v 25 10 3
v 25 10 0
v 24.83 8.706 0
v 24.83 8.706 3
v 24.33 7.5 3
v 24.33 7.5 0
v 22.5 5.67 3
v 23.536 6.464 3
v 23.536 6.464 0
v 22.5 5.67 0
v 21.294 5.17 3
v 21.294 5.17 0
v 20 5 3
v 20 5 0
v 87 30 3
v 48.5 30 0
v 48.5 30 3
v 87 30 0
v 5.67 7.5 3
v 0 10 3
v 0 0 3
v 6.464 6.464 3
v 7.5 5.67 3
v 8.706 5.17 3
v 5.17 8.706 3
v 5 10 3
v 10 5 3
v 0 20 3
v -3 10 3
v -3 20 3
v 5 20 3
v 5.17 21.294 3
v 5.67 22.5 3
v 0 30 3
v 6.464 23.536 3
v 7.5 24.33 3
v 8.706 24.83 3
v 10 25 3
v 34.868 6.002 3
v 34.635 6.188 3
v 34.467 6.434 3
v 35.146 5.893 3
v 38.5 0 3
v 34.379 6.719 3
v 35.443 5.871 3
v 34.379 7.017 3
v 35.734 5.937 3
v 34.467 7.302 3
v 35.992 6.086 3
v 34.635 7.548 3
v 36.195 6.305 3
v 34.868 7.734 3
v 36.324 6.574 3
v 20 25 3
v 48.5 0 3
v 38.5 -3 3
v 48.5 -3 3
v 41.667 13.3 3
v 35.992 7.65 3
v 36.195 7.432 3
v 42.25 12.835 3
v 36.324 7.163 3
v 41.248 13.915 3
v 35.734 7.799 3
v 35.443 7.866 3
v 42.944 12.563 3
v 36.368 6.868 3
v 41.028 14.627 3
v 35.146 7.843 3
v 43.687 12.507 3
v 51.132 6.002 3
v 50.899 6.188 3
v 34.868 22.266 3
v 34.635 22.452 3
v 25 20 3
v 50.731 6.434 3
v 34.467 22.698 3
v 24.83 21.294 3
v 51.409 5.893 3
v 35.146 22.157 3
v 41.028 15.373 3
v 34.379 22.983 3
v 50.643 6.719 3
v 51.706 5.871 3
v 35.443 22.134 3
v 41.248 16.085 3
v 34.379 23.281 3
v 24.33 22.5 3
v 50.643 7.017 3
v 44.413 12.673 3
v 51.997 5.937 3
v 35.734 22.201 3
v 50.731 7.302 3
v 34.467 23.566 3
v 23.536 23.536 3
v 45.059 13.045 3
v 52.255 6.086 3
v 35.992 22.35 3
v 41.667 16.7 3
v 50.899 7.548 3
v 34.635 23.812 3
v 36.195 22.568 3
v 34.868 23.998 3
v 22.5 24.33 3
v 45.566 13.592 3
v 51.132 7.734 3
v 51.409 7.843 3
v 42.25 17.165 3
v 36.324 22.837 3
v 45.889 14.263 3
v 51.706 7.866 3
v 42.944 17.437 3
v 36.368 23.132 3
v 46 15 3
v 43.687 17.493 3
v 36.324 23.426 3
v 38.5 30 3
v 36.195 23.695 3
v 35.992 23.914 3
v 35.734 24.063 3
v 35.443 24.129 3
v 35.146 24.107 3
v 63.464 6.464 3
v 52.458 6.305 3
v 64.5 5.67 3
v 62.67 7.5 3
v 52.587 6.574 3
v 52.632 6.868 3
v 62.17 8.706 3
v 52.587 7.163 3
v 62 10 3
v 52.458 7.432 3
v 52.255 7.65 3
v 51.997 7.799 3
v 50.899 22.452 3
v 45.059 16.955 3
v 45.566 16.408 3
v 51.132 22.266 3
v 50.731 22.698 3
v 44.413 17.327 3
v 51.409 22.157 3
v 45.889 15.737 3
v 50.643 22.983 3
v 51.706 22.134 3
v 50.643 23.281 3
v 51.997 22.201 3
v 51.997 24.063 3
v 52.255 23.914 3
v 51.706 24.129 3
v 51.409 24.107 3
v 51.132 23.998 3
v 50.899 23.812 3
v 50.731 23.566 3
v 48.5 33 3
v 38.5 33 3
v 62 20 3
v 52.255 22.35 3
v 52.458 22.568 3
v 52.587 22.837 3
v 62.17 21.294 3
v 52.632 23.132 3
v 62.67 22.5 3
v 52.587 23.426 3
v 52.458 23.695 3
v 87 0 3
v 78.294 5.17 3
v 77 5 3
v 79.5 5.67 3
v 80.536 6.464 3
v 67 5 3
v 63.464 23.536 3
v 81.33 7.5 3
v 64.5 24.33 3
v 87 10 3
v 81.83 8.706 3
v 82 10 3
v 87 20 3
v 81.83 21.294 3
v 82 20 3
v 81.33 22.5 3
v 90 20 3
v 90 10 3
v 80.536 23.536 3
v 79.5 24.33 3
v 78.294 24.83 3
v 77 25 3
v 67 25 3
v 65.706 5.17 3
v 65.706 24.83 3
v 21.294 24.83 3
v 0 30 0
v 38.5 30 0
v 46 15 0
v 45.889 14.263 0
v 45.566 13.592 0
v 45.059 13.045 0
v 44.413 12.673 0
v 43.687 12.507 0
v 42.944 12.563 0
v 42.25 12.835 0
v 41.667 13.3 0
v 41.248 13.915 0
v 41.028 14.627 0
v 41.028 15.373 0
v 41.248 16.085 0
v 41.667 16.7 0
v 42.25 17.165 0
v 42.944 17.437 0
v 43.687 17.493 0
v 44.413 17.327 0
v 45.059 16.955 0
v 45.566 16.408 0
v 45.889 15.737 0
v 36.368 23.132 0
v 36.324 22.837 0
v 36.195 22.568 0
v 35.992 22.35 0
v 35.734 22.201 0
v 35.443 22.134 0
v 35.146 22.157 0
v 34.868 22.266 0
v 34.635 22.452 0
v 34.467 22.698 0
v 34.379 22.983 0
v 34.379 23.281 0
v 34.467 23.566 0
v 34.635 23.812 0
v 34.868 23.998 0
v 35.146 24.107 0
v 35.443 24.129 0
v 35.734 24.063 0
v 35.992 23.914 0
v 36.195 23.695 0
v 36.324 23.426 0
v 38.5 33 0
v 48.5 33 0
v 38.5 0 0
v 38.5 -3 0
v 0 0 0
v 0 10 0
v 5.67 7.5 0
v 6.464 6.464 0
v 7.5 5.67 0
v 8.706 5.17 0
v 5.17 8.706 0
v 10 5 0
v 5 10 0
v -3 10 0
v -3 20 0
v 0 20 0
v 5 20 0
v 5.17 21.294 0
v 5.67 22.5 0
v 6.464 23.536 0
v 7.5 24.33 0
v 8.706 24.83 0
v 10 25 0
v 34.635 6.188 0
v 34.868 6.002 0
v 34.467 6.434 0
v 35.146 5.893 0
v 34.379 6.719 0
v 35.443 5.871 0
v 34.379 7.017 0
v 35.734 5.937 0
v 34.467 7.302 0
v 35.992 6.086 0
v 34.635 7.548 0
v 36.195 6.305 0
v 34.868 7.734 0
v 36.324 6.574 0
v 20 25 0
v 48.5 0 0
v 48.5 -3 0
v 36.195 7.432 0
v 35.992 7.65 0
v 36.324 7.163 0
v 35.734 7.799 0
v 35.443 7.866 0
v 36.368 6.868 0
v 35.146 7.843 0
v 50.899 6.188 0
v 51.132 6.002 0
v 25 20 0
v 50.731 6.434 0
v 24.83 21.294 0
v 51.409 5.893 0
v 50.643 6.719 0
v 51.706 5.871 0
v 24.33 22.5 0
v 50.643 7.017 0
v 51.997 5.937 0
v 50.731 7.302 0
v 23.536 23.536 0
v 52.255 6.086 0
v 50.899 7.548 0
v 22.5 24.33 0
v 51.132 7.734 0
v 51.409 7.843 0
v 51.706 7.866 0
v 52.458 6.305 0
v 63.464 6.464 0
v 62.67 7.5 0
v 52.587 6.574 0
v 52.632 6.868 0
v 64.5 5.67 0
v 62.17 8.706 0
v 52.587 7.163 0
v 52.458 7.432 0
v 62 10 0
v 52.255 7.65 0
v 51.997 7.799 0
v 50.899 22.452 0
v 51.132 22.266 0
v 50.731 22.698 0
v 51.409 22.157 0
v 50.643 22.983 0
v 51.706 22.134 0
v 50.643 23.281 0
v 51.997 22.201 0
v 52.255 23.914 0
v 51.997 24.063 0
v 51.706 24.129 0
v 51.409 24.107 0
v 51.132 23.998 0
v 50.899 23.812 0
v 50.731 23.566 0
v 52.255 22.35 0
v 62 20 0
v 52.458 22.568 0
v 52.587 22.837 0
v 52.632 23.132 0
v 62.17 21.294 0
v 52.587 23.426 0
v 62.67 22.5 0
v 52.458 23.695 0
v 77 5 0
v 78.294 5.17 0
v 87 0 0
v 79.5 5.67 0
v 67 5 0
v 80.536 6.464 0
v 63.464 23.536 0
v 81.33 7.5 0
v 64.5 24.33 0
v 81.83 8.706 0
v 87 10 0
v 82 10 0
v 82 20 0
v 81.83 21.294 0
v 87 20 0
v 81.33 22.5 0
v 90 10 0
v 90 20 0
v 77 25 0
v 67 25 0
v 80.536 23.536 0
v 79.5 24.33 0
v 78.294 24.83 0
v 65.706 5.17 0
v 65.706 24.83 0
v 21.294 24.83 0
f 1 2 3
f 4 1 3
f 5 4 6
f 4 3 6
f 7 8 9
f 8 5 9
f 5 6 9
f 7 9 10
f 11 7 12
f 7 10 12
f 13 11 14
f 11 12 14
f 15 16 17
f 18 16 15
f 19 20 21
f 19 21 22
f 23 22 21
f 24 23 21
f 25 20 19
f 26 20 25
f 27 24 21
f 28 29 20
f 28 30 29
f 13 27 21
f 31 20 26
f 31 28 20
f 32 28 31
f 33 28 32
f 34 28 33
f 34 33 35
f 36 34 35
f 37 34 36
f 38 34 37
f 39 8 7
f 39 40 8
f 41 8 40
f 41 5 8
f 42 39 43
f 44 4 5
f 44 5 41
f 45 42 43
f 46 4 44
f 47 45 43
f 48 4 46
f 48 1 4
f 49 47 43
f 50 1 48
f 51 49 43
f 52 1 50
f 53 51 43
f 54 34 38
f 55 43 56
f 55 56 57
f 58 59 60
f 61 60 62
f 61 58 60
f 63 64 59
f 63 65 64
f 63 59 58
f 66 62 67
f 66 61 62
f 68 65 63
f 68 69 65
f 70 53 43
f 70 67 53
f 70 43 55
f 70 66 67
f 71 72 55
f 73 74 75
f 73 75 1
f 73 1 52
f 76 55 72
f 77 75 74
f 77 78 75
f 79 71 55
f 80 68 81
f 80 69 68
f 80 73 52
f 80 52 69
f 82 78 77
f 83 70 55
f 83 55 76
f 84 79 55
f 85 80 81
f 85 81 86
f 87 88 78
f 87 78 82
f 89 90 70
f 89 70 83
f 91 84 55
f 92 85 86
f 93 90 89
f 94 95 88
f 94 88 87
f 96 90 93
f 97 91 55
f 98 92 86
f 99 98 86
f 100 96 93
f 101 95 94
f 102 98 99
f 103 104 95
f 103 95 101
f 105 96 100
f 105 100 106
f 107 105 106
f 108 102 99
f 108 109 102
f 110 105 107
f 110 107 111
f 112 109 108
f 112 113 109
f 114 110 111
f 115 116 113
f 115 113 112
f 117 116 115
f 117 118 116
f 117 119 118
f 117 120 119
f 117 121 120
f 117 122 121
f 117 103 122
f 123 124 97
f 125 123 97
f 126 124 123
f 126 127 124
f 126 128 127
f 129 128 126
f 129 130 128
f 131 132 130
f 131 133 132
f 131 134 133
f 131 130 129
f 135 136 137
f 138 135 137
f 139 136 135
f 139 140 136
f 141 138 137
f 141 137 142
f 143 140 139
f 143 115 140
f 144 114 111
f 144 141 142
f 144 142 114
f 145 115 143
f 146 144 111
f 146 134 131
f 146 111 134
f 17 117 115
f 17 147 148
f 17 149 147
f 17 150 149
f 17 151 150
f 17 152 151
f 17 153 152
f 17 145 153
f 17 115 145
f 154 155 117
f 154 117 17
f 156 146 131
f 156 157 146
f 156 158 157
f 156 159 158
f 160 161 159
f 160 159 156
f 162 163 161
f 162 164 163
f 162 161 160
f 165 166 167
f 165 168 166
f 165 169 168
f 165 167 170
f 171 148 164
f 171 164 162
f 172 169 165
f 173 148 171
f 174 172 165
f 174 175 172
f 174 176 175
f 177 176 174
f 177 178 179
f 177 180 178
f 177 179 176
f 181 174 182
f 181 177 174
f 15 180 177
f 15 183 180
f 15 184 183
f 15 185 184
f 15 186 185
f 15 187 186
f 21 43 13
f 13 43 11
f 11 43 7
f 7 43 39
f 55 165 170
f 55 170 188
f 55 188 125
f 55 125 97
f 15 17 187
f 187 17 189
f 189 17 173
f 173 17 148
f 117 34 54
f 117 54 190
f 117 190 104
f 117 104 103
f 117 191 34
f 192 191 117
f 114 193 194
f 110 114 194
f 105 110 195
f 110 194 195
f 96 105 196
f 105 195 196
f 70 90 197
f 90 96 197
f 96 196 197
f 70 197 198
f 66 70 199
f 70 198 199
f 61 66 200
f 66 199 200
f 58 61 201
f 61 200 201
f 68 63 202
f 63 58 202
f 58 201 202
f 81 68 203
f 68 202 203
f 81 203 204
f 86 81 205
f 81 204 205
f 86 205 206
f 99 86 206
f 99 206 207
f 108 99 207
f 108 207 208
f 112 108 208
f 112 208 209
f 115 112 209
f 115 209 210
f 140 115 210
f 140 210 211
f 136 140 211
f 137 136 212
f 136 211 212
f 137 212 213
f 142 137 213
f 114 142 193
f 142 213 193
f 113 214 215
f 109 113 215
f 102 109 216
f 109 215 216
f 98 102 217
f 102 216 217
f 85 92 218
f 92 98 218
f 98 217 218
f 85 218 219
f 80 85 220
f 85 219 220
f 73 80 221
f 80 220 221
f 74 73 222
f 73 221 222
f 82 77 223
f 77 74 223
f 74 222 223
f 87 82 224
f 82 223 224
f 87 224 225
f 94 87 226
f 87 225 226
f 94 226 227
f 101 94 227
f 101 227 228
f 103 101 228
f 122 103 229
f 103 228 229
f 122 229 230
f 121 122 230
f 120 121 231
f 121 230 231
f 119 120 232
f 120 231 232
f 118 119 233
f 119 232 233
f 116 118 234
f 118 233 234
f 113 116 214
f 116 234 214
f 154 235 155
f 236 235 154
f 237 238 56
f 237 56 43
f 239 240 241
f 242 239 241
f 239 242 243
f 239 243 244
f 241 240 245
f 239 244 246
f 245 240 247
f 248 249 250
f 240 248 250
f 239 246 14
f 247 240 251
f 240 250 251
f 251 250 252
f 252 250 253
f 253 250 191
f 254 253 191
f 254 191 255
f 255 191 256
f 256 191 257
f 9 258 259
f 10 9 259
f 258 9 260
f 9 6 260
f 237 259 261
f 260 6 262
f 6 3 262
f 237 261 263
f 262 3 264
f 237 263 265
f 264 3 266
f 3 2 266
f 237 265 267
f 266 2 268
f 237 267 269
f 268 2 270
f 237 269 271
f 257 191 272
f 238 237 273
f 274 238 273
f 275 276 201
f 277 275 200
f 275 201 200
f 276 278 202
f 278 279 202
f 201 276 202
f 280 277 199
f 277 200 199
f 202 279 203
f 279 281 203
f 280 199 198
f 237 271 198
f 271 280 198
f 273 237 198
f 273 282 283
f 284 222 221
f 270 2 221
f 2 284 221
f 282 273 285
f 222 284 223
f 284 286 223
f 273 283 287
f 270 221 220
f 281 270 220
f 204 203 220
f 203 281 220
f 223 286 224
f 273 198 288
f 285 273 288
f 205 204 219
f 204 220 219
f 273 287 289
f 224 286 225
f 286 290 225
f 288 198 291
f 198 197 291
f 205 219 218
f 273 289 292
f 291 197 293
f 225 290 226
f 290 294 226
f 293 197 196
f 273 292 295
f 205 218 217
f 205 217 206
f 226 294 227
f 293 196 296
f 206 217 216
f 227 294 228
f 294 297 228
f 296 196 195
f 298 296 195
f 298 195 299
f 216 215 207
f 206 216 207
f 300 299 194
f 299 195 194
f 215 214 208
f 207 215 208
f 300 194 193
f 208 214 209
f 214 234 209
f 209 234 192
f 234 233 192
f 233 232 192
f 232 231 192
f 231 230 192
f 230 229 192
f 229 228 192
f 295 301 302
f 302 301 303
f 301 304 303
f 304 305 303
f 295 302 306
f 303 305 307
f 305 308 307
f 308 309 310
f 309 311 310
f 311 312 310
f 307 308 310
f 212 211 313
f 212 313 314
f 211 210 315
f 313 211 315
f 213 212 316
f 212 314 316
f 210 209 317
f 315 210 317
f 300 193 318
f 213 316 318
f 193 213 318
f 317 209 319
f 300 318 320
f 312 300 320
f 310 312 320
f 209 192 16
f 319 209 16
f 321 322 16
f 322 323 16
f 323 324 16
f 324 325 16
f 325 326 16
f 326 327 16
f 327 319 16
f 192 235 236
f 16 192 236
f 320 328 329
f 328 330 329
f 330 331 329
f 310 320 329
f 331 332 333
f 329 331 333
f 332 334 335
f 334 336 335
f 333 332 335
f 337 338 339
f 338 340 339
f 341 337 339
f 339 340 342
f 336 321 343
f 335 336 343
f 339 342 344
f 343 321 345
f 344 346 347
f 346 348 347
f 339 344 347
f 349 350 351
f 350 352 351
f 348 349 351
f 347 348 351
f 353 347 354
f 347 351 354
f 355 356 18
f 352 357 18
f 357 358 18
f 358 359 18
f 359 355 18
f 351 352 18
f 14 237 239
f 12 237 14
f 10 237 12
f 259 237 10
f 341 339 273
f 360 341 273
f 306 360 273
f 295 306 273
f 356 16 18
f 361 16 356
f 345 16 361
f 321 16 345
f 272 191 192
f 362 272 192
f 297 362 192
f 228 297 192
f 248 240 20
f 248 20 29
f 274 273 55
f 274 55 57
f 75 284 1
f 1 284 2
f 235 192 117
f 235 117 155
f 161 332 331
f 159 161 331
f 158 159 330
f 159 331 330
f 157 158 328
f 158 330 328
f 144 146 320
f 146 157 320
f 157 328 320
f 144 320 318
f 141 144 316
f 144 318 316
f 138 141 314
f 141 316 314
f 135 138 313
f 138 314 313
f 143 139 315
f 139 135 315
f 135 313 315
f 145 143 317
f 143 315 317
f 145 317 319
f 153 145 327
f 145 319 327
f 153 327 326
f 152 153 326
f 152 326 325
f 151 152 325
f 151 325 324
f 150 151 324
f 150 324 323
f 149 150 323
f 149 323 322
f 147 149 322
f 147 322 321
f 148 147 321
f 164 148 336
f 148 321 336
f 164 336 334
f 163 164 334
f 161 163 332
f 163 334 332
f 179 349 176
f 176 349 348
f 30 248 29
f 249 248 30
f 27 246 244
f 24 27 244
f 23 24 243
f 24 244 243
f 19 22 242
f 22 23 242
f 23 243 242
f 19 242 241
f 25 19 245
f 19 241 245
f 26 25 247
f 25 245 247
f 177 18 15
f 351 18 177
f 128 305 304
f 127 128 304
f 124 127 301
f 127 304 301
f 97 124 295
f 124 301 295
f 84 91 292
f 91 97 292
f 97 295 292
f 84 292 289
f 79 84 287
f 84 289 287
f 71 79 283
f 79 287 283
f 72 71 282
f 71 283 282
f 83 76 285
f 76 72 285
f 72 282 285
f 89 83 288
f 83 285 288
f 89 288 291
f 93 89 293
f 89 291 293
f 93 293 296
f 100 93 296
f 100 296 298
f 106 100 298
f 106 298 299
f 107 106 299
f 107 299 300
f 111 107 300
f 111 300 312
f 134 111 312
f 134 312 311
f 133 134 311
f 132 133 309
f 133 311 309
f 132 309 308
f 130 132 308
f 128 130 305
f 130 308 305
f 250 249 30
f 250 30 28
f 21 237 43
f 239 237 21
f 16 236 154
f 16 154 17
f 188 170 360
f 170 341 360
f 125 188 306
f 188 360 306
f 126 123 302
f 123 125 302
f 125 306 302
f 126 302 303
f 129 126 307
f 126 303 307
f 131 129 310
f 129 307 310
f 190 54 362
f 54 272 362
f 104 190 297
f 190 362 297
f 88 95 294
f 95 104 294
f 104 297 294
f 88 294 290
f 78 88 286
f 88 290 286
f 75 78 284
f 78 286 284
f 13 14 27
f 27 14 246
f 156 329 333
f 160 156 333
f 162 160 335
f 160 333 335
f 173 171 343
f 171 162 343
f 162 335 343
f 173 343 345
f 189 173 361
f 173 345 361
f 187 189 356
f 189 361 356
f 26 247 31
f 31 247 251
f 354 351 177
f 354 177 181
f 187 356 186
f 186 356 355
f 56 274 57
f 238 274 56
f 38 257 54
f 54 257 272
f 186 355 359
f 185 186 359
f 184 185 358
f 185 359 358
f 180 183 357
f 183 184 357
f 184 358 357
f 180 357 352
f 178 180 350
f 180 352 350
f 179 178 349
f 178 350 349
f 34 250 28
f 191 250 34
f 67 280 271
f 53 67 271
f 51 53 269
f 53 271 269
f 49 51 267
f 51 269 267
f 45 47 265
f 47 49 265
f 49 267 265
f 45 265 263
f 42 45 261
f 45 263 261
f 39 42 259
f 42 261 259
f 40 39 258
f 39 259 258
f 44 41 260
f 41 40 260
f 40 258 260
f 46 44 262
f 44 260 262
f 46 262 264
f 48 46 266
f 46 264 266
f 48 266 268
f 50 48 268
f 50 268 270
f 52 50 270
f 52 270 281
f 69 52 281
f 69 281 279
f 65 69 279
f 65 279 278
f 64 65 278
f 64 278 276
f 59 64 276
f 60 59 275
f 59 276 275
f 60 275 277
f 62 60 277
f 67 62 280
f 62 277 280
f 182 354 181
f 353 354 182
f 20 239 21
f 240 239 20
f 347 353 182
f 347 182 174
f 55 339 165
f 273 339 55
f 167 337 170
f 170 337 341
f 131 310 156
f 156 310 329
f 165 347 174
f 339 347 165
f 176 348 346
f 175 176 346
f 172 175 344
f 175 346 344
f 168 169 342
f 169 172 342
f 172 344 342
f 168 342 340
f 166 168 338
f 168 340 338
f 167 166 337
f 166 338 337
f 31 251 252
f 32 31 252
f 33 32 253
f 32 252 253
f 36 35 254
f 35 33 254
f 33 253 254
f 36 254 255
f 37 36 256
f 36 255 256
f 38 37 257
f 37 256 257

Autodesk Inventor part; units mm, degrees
ref_plane "YZ Plane" through (0, 0, 0) normal (1, 0, 0) x (0, 1, 0)
ref_plane "XZ Plane" through (0, 0, 0) normal (0, 1, 0) x (-1, 0, 0)
ref_plane "XY Plane" through (0, 0, 0) normal (0, 0, 1) x (1, 0, 0)
sketch "Sketch1" plane through (0, 0, 0) normal (0, 0, 1) x (1, 0, 0)
  line L0 (0, 0) -> (0, 10)
  line L1 (0, 10) -> (-3, 10)
  line L2 (-3, 10) -> (-3, 20)
  line L3 (-3, 20) -> (0, 20)
  line L4 (0, 20) -> (0, 30)
  line L5 (0, 30) -> (38.5, 30)
  line L6 (38.5, 30) -> (38.5, 33)
  line L7 (38.5, 33) -> (48.5, 33)
  line L8 (48.5, 33) -> (48.5, 30)
  line L9 (48.5, 30) -> (87, 30)
  line L10 (87, 30) -> (87, 20)
  line L11 (87, 20) -> (90, 20)
  line L12 (90, 20) -> (90, 10)
  line L13 (90, 10) -> (87, 10)
  line L14 (87, 10) -> (87, 0)
  line L15 (87, 0) -> (48.5, 0)
  line L16 (48.5, 0) -> (48.5, -3)
  line L17 (48.5, -3) -> (38.5, -3)
  line L18 (38.5, -3) -> (38.5, 0)
  line L19 (38.5, 0) -> (0, 0)
  line L20 (10, 25) -> (20, 25)
  line L21 (25, 20) -> (25, 10)
  line L22 (20, 5) -> (10, 5)
  line L23 (5, 10) -> (5, 20)
  line L24 (67, 25) -> (77, 25)
  line L25 (82, 20) -> (82, 10)
  line L26 (77, 5) -> (67, 5)
  line L27 (62, 10) -> (62, 20)
  arc A0 (10, 25) -> (5, 20) centre (10, 20) ccw
  arc A1 (25, 20) -> (20, 25) centre (20, 20) ccw
  arc A2 (20, 5) -> (25, 10) centre (20, 10) ccw
  arc A3 (5, 10) -> (10, 5) centre (10, 10) ccw
  arc A4 (67, 25) -> (62, 20) centre (67, 20) ccw
  arc A5 (82, 20) -> (77, 25) centre (77, 20) ccw
  arc A6 (77, 5) -> (82, 10) centre (77, 10) ccw
  arc A7 (62, 10) -> (67, 5) centre (67, 10) ccw
  circle A8 centre (43.5, 15) radius 2.5
  circle A9 centre (35.3683, 23.1317) radius 1
  circle A10 centre (35.3683, 6.8683) radius 1
  circle A11 centre (51.6317, 6.8683) radius 1
  circle A12 centre (51.6317, 23.1317) radius 1
  dimension "d0" = 10
  dimension "d1" = 10
  dimension "d2" = 10
  dimension "d3" = 10
  dimension "d4" = 10
  dimension "d5" = 10
  dimension "d6" = 38.5
  dimension "d7" = 38.5
  dimension "d8" = 10
  dimension "d9" = 38.5
  dimension "d11" = 38.5
  dimension "d12" = 5
  dimension "d13" = 5
  dimension "d15" = 5
  dimension "d16" = 20
  dimension "d17" = 5
  dimension "d18" = 5
  dimension "d19" = 5
  dimension "d20" = 20
  dimension "d21" = 3
  dimension "d23" = 3
  dimension "d24" = 3
  dimension "d25" = 5
  dimension "d26" = 5
  dimension "d27" = 5
  dimension "d28" = 15
  dimension "d30" = 2
  dimension "d34" = 360
  dimension "d38" = 3
  dimension "d39" = 10
extrude "Extrusion1" add sketch "Sketch1" along normal blind 3
properties part number "OpenROV 2_3 Dev Vertical Motor Mount"
